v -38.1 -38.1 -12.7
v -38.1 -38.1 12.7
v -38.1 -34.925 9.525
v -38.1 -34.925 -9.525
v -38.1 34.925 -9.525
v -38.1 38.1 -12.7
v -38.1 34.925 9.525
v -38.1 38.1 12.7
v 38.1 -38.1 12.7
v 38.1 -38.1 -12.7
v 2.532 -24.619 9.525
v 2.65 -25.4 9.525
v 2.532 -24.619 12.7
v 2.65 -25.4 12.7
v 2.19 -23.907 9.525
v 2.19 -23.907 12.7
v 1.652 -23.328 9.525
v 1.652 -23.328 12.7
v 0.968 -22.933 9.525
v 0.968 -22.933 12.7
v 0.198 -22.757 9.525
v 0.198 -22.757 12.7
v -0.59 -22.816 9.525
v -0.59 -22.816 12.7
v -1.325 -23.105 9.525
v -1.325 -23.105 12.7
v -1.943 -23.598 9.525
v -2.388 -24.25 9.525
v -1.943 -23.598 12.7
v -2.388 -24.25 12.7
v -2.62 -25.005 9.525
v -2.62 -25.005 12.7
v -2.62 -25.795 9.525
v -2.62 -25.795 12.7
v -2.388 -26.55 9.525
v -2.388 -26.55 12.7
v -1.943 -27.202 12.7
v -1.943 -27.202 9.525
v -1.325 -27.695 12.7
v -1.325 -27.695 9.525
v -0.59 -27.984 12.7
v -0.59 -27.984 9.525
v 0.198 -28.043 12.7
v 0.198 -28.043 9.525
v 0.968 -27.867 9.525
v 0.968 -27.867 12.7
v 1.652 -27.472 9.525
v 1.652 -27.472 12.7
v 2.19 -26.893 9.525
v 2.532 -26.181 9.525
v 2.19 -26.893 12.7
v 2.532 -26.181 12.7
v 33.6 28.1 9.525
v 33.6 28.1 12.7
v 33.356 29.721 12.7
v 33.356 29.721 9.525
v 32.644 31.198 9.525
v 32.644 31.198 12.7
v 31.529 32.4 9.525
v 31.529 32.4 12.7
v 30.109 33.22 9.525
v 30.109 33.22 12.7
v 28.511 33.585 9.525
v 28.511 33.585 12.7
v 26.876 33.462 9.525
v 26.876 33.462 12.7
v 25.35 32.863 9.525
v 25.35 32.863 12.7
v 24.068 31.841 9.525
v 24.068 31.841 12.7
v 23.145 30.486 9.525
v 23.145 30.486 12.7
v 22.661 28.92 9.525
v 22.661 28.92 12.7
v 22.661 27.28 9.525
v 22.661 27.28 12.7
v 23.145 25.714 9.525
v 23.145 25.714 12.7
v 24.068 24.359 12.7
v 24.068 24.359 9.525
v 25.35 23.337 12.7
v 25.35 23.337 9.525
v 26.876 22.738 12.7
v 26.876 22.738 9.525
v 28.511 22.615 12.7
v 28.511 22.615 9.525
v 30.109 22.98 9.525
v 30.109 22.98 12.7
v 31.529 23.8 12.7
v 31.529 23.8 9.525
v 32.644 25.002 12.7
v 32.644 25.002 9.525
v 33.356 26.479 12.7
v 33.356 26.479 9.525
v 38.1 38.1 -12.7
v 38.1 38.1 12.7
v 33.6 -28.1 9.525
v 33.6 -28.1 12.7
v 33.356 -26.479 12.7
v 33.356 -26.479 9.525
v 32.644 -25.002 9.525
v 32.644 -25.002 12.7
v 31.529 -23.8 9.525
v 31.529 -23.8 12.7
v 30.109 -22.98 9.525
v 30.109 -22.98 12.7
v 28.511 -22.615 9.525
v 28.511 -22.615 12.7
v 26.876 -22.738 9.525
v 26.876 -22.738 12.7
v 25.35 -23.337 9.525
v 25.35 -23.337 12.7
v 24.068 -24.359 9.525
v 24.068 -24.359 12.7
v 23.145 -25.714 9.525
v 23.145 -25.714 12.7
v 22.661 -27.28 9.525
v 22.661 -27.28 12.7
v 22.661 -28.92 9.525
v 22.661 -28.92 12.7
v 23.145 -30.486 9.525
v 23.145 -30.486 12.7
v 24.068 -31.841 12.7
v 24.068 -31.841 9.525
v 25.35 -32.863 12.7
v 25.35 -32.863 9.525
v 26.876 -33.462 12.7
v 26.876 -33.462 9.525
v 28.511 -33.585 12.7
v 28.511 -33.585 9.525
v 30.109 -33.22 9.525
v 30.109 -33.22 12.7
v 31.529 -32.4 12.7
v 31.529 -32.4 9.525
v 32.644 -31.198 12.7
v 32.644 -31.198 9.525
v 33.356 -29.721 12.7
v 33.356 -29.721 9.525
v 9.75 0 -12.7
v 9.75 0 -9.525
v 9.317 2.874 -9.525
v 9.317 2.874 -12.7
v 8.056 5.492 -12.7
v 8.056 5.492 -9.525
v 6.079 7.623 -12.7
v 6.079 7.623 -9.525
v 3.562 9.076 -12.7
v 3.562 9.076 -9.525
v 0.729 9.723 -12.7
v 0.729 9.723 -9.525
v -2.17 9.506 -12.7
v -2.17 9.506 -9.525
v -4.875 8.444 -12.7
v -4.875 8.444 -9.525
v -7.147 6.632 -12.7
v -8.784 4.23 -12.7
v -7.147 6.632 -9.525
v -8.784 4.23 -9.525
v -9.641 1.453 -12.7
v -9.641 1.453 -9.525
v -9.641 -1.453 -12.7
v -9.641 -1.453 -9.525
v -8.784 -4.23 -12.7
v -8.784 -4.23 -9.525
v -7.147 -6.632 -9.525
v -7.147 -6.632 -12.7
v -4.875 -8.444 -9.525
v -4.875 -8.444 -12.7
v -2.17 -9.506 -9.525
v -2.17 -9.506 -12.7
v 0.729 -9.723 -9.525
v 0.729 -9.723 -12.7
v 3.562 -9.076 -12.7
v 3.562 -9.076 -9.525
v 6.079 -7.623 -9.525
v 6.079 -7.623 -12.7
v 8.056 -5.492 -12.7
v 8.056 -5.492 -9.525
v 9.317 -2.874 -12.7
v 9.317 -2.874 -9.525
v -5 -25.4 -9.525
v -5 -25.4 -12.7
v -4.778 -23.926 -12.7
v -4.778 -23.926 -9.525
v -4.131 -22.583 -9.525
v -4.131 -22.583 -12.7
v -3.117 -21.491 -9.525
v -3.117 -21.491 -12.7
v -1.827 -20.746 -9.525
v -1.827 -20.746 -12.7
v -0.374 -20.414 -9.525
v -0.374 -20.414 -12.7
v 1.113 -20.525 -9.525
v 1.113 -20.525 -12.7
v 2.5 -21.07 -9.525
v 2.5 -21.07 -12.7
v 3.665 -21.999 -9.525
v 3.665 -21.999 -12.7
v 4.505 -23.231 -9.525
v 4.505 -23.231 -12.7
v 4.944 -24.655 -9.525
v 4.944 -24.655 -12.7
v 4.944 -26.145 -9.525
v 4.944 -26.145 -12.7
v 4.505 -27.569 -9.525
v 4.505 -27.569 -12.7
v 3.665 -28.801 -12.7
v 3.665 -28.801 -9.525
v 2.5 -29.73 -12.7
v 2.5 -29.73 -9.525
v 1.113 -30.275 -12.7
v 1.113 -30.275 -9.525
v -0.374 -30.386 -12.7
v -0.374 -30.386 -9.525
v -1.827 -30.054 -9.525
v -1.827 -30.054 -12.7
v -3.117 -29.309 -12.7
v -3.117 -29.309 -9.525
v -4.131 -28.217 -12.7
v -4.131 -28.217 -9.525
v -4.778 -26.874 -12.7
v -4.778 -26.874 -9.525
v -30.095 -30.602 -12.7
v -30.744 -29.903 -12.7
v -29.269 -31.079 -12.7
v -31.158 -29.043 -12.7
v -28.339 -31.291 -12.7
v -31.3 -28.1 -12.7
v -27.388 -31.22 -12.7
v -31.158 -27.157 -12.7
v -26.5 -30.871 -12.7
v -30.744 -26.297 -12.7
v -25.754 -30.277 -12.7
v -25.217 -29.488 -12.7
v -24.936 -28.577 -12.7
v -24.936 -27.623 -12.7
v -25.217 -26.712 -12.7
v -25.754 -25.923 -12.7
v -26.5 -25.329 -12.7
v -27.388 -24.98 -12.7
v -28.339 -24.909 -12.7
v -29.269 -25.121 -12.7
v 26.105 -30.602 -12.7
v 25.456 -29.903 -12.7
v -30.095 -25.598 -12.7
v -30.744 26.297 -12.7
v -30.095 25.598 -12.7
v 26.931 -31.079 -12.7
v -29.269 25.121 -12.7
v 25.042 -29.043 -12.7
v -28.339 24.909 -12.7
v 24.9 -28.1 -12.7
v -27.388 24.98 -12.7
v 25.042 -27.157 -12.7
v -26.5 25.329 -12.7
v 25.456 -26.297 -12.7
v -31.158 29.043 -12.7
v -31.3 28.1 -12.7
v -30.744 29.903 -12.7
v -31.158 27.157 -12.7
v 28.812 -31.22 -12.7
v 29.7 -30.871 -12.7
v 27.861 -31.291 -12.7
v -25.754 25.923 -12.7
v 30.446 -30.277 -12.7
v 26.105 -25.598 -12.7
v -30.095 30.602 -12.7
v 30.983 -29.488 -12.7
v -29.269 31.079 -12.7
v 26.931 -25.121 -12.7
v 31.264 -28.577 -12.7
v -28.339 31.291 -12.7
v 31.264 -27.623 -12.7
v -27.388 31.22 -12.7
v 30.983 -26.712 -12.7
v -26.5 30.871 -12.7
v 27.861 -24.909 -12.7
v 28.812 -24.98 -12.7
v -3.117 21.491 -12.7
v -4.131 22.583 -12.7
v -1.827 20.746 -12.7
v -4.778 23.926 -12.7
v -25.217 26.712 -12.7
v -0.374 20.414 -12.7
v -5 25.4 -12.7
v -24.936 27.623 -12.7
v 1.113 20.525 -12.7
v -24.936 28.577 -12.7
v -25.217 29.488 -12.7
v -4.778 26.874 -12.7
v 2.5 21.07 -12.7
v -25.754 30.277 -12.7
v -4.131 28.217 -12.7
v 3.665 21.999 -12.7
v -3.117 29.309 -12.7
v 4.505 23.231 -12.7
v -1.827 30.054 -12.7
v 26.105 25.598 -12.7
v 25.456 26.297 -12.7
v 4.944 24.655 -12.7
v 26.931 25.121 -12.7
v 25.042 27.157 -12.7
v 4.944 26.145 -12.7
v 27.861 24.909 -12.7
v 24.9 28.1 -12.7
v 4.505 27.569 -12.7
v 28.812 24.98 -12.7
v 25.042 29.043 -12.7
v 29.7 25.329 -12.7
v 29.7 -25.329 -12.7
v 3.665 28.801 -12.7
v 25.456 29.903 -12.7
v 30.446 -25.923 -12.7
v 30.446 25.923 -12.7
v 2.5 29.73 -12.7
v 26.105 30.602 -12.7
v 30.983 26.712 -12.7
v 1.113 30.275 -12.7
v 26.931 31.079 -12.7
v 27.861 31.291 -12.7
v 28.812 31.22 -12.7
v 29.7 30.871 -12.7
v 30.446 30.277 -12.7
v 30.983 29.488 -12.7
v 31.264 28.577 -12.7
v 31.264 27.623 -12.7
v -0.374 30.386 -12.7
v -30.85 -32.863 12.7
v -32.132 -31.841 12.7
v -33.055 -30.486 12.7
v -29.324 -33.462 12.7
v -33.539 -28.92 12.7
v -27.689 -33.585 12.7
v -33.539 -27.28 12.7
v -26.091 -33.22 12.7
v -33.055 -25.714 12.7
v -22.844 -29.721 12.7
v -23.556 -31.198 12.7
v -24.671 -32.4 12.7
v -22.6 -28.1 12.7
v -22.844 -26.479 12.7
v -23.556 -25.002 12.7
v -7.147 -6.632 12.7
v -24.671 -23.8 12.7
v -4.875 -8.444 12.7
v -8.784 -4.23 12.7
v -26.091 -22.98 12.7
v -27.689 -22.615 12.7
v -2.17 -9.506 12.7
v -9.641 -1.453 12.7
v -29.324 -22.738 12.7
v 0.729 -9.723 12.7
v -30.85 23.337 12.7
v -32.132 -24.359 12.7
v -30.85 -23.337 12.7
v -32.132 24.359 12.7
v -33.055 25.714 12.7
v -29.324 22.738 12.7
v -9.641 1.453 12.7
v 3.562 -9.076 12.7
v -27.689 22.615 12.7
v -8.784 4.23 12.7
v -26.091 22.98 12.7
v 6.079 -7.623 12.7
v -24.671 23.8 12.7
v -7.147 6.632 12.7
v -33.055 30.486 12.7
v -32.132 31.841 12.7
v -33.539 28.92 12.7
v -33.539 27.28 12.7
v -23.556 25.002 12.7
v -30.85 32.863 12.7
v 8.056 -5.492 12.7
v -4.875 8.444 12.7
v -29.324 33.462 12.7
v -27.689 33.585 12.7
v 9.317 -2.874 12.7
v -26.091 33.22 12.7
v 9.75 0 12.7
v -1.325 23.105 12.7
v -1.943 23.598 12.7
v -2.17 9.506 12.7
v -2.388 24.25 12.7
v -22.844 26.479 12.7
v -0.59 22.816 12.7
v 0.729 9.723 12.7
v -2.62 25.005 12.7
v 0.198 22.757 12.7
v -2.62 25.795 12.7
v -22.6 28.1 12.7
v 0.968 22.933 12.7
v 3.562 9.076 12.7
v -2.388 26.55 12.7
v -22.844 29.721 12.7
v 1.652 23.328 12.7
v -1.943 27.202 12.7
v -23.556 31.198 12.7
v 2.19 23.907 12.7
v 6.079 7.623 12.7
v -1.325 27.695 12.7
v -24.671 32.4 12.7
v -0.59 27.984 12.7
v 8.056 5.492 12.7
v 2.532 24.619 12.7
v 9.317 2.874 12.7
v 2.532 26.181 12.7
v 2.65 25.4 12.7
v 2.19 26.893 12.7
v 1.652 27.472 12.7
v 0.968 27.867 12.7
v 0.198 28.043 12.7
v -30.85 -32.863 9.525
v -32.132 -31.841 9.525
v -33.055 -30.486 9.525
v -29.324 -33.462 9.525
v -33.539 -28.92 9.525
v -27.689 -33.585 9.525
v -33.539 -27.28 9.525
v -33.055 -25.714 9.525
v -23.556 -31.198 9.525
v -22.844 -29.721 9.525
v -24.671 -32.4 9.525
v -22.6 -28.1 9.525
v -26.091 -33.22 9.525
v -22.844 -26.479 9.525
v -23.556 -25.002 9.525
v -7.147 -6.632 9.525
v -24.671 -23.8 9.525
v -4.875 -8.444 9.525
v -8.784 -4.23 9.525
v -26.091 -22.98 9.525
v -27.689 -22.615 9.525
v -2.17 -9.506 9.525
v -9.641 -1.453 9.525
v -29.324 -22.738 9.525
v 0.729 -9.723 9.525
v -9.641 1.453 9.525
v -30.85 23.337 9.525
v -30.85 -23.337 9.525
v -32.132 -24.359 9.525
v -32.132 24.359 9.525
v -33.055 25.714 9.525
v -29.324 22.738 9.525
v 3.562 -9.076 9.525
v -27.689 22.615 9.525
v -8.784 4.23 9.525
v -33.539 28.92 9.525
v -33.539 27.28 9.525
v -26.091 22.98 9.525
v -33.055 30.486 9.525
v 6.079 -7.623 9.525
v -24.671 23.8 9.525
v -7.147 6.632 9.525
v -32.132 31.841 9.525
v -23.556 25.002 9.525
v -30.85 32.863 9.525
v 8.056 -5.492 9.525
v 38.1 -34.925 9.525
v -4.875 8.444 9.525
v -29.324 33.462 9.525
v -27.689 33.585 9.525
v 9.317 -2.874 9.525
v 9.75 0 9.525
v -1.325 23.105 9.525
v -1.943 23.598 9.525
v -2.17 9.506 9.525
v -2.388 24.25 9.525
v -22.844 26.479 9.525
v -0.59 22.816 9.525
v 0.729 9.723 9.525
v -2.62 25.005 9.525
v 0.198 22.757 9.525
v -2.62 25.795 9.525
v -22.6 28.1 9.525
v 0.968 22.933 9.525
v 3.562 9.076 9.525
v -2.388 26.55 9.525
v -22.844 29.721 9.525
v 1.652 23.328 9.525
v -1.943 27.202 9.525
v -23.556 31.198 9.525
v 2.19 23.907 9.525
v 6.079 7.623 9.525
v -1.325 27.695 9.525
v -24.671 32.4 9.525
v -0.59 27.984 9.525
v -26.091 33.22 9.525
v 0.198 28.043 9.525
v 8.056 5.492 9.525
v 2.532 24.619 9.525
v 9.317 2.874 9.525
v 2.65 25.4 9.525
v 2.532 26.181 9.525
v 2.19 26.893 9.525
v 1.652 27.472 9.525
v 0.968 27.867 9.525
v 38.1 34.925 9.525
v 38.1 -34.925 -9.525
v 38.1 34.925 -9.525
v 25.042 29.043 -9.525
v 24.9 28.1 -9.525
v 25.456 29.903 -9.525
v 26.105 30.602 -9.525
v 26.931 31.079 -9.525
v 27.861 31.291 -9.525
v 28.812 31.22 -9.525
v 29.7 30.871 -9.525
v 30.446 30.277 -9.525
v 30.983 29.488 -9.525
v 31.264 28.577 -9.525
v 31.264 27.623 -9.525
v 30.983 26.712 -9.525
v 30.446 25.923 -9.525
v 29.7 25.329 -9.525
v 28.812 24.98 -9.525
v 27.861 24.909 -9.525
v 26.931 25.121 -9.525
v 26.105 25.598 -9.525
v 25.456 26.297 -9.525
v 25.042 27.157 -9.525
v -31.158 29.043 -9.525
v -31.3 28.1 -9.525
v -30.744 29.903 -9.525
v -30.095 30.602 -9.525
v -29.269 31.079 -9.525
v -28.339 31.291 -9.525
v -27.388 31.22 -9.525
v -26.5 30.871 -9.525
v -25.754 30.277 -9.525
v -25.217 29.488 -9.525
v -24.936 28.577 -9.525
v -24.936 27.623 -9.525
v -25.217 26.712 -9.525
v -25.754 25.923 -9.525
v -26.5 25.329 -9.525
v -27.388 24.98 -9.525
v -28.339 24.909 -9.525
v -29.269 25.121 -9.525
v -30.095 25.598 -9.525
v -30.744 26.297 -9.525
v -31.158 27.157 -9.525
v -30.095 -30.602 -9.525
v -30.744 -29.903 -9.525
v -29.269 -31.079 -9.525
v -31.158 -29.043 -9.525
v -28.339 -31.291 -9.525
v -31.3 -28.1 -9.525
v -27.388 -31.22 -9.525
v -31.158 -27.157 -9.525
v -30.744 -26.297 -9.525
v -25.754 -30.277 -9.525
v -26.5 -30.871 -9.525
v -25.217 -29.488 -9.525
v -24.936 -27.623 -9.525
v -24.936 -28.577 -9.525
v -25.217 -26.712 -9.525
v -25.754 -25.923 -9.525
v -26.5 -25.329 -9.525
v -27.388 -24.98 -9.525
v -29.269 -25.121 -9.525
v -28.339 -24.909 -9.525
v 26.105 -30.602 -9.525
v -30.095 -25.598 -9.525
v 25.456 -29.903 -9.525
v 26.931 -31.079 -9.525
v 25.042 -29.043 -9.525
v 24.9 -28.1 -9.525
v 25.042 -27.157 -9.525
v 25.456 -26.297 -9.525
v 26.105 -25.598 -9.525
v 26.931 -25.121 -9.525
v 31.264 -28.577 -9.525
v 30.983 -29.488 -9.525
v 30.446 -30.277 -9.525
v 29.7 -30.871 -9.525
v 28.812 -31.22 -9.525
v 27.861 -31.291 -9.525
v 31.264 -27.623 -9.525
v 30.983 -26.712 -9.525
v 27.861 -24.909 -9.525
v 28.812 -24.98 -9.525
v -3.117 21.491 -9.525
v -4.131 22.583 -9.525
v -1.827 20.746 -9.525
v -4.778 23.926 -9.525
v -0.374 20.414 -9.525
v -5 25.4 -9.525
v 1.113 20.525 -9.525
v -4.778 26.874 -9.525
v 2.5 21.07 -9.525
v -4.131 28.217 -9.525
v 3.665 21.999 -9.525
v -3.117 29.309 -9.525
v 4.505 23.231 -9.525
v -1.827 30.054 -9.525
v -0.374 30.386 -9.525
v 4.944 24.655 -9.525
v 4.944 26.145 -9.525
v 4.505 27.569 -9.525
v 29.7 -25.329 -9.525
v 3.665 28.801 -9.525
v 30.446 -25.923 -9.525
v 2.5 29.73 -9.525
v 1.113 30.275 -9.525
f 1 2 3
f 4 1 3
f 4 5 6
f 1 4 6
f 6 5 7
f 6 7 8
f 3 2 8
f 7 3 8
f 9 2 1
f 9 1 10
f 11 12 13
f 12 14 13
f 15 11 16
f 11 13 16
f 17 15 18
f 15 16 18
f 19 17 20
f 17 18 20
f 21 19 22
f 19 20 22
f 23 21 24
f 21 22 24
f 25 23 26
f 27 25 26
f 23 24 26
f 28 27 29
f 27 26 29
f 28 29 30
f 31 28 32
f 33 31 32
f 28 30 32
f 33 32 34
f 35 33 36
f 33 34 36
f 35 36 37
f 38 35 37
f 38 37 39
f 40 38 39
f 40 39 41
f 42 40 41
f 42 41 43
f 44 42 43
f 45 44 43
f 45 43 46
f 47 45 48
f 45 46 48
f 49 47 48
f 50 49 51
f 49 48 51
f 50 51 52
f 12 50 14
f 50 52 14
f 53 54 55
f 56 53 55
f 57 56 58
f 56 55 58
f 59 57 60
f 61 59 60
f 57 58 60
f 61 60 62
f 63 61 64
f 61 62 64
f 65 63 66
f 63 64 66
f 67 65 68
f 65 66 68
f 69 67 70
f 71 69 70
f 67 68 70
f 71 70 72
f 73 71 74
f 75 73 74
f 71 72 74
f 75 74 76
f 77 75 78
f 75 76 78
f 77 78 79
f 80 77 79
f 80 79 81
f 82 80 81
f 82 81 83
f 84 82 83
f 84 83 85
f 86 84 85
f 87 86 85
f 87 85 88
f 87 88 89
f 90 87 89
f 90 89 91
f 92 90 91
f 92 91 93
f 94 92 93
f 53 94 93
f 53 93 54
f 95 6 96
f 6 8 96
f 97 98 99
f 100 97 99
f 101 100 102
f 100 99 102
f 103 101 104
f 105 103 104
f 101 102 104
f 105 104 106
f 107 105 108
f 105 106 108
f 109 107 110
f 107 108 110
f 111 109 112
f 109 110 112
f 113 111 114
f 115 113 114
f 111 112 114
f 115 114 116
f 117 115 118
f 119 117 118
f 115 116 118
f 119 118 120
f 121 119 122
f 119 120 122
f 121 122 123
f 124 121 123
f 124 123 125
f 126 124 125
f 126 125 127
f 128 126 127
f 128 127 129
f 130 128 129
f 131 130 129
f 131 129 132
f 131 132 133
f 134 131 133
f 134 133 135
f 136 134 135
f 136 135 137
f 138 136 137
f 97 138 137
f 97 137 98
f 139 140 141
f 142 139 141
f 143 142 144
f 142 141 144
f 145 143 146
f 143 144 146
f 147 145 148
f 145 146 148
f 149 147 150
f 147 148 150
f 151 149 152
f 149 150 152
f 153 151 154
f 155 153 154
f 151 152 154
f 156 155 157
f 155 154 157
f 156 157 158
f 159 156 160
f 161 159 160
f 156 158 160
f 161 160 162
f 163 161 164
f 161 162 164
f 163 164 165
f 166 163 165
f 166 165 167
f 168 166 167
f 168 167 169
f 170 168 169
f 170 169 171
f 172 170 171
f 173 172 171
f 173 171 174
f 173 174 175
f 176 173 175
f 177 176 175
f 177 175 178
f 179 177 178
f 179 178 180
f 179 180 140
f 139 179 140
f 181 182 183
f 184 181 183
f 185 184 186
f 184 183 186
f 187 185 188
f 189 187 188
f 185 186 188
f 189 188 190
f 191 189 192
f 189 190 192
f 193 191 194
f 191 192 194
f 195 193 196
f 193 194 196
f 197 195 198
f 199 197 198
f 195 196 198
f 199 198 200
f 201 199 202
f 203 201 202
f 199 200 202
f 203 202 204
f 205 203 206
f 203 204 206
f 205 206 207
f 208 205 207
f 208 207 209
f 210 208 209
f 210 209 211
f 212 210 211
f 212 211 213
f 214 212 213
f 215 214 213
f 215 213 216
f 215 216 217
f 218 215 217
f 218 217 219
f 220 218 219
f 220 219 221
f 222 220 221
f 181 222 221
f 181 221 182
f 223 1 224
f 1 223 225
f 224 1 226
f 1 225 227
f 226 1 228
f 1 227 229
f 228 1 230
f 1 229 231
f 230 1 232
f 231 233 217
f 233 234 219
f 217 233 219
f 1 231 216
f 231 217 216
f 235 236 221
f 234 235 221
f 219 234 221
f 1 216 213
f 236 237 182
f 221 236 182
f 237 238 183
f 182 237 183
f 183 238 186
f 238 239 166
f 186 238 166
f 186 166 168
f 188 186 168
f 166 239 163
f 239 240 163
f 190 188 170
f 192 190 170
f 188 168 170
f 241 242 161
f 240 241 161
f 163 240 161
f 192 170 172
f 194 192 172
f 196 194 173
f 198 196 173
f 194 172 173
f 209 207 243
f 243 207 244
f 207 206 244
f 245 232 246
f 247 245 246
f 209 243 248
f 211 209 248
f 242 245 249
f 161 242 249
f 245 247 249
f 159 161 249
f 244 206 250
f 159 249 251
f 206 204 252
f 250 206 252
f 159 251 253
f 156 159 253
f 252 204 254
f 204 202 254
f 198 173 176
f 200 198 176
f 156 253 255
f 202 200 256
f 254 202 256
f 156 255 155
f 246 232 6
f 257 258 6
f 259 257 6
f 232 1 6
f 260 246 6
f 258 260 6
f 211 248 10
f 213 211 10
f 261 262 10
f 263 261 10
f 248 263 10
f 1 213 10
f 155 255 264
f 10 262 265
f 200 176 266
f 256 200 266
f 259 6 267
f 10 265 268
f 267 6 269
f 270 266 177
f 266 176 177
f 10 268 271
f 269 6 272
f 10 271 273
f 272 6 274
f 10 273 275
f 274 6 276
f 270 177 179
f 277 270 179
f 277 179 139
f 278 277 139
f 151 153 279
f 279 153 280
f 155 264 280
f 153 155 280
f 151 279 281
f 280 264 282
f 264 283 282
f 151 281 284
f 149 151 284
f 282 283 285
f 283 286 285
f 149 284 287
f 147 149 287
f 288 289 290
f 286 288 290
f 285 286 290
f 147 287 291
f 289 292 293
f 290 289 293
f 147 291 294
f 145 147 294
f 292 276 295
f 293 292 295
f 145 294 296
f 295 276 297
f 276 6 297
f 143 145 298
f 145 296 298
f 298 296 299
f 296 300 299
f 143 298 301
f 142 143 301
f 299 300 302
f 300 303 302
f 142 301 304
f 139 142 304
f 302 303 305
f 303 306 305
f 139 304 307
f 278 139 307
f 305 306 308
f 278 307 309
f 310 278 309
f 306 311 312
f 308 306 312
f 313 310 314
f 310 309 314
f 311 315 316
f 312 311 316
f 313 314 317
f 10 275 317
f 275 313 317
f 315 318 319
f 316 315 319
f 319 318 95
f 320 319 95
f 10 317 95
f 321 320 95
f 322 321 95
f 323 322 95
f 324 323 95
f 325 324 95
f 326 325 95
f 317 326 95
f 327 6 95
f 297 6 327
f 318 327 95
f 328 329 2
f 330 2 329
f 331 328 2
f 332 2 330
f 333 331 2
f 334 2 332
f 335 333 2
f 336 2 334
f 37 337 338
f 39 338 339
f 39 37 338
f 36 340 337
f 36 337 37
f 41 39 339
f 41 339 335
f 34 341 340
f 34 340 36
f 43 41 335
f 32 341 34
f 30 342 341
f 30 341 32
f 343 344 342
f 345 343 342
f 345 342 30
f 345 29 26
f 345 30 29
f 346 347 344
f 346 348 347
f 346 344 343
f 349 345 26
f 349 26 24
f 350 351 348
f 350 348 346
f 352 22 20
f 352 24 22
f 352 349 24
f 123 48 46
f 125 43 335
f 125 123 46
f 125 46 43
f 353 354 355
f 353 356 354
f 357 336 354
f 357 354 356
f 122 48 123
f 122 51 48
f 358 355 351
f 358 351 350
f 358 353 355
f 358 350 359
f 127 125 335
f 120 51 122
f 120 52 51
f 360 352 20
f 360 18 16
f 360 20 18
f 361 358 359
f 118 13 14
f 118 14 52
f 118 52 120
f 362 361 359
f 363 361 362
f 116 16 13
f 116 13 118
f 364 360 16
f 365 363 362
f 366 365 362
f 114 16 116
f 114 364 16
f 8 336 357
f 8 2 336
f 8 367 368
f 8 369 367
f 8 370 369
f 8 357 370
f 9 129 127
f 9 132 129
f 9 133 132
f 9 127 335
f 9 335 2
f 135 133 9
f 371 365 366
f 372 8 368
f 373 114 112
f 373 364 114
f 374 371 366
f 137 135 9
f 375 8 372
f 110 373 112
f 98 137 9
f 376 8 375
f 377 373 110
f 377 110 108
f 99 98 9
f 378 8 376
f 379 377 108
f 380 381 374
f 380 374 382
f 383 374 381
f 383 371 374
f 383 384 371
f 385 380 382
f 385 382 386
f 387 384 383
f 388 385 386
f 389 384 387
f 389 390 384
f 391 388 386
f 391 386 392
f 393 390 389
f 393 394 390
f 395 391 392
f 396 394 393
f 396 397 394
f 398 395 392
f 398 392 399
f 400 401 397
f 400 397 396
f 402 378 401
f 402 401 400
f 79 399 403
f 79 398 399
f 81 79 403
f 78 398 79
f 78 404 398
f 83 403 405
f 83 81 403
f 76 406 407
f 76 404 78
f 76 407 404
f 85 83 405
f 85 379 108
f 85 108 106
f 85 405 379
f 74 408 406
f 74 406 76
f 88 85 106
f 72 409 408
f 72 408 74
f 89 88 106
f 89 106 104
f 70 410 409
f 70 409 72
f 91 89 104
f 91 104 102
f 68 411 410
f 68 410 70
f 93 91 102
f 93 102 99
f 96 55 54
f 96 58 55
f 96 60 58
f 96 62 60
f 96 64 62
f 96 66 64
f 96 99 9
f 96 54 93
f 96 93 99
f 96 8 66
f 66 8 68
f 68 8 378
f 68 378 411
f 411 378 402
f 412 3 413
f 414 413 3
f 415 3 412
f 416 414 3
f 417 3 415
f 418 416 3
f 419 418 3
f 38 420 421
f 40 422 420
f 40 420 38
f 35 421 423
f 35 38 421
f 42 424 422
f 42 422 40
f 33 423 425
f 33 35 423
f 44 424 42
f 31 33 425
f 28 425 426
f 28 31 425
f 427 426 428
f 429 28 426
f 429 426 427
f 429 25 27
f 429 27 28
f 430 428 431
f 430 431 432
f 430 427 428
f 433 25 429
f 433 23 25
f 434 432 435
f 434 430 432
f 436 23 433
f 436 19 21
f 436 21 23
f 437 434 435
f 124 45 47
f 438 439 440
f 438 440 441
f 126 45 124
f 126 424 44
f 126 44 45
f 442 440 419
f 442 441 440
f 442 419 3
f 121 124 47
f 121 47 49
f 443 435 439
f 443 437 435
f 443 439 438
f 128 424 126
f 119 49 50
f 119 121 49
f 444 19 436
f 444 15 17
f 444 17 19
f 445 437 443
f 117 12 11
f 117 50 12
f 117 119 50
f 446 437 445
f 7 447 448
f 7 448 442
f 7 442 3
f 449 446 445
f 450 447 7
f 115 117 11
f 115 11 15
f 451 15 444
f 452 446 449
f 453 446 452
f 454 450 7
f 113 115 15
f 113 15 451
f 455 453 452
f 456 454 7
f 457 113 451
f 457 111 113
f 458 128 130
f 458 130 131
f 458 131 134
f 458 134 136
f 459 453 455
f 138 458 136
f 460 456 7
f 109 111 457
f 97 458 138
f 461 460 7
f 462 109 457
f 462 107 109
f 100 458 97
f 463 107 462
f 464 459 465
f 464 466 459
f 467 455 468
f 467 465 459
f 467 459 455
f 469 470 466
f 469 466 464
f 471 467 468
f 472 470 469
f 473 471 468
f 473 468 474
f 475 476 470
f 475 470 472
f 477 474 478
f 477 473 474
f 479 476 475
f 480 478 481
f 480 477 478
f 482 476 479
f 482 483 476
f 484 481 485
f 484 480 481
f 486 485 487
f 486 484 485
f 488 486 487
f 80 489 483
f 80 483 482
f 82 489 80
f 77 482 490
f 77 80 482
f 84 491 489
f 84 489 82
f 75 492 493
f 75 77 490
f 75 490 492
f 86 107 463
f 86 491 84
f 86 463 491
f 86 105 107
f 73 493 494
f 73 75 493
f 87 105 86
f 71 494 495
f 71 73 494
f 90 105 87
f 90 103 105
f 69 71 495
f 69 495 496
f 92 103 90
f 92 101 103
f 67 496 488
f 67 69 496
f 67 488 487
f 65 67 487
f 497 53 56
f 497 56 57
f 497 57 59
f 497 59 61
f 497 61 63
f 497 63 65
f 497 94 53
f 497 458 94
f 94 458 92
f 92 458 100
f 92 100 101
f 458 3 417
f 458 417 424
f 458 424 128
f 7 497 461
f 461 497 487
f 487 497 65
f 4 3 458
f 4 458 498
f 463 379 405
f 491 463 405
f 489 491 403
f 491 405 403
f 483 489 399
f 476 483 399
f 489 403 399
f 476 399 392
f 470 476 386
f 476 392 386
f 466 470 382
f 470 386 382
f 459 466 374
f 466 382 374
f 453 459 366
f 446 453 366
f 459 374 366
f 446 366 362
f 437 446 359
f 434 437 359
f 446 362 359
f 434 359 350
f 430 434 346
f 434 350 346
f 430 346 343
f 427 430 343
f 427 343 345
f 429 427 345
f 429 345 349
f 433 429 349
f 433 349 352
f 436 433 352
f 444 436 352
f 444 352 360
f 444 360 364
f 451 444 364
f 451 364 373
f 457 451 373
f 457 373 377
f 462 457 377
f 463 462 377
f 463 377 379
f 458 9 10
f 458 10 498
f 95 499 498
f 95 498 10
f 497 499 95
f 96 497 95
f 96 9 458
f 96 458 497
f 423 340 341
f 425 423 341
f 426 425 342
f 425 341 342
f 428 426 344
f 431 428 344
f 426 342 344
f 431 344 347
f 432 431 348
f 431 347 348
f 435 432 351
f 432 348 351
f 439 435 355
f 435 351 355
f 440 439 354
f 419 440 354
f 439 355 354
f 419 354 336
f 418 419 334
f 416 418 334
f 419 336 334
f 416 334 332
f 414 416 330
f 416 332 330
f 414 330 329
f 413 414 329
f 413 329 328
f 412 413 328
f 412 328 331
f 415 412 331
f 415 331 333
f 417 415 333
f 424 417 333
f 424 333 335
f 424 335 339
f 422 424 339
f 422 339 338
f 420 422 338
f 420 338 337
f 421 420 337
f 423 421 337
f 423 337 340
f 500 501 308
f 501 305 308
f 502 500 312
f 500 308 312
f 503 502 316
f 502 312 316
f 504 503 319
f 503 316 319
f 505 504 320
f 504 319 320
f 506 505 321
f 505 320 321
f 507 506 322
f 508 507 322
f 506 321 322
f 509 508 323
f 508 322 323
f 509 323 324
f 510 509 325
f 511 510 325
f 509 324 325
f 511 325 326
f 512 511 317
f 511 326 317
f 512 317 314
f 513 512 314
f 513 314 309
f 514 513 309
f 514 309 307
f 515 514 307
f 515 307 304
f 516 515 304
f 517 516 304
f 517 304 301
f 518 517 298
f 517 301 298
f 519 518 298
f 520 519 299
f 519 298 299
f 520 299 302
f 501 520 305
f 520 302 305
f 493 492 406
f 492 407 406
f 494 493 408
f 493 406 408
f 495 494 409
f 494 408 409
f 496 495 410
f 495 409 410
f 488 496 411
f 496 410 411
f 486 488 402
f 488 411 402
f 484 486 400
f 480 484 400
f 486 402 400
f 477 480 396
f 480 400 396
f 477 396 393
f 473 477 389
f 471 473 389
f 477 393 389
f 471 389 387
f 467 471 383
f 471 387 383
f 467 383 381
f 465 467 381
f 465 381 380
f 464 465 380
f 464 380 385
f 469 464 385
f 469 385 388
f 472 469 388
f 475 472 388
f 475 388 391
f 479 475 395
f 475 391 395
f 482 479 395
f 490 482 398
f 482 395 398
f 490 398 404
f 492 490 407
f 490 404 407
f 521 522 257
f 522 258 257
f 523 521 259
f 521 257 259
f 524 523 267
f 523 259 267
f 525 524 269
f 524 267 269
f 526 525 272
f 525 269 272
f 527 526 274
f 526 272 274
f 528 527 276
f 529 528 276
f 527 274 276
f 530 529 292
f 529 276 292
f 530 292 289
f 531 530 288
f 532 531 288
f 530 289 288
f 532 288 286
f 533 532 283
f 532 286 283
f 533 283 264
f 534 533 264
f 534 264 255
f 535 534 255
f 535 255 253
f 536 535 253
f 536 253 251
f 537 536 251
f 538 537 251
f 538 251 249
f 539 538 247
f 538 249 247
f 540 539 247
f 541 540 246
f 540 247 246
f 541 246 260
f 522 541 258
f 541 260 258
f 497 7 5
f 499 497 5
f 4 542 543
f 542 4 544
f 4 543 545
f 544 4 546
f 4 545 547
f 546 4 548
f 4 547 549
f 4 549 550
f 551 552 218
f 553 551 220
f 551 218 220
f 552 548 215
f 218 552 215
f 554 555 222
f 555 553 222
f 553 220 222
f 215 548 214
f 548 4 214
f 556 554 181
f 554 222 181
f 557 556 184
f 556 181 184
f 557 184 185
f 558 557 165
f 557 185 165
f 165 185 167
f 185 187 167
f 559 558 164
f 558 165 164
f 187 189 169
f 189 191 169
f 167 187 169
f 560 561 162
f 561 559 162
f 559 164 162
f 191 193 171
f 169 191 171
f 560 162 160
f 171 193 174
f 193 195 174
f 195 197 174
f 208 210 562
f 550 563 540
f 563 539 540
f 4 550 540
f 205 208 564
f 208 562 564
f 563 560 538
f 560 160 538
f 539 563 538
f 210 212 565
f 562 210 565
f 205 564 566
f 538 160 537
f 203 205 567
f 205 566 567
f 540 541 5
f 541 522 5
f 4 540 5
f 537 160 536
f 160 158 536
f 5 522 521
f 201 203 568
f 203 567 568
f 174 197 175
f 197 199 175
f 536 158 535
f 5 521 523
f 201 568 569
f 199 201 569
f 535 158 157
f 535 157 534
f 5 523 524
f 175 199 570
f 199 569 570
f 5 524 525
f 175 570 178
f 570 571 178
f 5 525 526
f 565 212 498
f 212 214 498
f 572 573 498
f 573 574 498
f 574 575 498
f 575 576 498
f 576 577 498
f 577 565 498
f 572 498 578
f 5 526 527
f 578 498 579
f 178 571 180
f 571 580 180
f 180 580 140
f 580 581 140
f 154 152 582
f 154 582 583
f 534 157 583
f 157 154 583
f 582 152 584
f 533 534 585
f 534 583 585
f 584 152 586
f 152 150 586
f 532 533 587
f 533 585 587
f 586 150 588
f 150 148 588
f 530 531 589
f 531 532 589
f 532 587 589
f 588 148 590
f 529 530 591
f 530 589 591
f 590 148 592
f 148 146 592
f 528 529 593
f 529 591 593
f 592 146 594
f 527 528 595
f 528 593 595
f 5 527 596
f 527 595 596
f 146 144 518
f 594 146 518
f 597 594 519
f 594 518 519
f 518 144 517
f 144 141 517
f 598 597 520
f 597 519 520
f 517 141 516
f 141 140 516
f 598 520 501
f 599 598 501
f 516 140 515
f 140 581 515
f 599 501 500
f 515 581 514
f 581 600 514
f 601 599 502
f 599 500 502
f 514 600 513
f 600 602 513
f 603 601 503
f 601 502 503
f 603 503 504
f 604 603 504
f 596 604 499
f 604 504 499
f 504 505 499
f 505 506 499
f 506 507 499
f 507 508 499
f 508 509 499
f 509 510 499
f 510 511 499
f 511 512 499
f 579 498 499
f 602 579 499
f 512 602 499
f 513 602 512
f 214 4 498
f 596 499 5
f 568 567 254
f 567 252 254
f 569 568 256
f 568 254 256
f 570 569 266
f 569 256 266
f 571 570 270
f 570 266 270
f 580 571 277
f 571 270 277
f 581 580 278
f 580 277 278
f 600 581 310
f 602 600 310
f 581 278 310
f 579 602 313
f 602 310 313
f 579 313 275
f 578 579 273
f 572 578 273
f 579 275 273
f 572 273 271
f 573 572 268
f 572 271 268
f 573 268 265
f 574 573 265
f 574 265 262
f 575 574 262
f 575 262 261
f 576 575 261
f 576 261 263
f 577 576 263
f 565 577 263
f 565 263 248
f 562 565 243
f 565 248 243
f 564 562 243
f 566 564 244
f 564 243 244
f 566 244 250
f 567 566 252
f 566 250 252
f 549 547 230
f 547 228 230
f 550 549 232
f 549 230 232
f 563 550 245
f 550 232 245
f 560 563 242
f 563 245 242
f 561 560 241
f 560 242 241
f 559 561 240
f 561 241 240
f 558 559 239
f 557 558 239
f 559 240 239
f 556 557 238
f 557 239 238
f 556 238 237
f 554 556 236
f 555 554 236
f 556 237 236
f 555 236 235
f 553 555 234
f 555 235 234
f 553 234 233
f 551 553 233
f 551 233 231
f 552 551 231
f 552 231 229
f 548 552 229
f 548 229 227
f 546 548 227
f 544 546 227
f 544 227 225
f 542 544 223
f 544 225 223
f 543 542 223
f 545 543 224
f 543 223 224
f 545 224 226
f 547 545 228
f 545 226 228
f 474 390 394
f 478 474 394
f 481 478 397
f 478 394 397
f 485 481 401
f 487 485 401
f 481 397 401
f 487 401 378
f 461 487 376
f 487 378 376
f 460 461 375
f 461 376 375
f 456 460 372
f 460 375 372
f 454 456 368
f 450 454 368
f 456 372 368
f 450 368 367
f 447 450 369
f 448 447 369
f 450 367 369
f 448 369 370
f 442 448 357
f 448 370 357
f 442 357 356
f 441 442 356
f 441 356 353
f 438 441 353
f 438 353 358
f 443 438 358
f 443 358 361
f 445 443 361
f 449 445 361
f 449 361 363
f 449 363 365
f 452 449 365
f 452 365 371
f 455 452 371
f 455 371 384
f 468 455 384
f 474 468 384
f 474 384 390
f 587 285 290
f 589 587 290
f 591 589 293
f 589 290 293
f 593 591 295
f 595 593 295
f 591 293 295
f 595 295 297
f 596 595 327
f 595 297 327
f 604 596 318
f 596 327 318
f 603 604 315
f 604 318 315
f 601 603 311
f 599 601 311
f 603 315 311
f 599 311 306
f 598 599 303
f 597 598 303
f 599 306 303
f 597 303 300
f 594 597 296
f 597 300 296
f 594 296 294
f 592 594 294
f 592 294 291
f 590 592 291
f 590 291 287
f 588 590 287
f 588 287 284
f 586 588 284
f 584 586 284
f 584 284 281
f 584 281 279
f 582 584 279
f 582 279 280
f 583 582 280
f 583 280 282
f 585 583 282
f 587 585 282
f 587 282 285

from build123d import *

# Parameters (mm, degrees)
SKETCH1_W                                       = 76.2
SKETCH1_H                                       = 76.2
BOSS_EXTRUDE1_DEPTH                             = 12.7
SKETCH2_W                                       = 19.05
SKETCH2_H                                       = 69.85
CUT_EXTRUDE1_DEPTH                              = 77.2
SKETCH4_R                                       = 9.75
SKETCH4_R_2                                     = 2.2
SKETCH4_R_3                                     = 2.368967754
SKETCH4_R_4                                     = 2.114206927
SKETCH4_R_5                                     = 2.315385773
SKETCH4_R_6                                     = 1.799630575
CUT_EXTRUDE2_DEPTH                              = 26.4
CBORE_FOR_M6_SOCKET_HEAD_CAP_SCREW1_D           = 6.4
CBORE_FOR_M6_SOCKET_HEAD_CAP_SCREW1_CBORE_D     = 11
CBORE_FOR_M6_SOCKET_HEAD_CAP_SCREW1_CBORE_DEPTH = 6.4
CUT_EXTRUDE3_REACH                              = 27.4
SKETCH8_R                                       = 3.81
CBORE_FOR_M5_SOCKET_HEAD_CAP_SCREW3_D           = 5.3
CBORE_FOR_M5_SOCKET_HEAD_CAP_SCREW3_CBORE_D     = 10
CBORE_FOR_M5_SOCKET_HEAD_CAP_SCREW3_CBORE_DEPTH = 5.4


with BuildPart() as part:
    # Sketch1 → Boss-Extrude1 (new body, symmetric)
    with BuildSketch(Plane.XY):
        Rectangle(SKETCH1_W, SKETCH1_H)
    extrude(amount=BOSS_EXTRUDE1_DEPTH, both=True)

    # Sketch2 → Cut-Extrude1 (cut, through all)
    with BuildSketch(Plane(origin=(38.1, 0, 0), x_dir=(0, 0, -1), z_dir=(1, 0, 0))):
        Rectangle(SKETCH2_W, SKETCH2_H)
    extrude(amount=-CUT_EXTRUDE1_DEPTH, mode=Mode.SUBTRACT)

    # Sketch4 → Cut-Extrude2 (cut, through all)
    with BuildSketch(Plane.XY.offset(12.7)):
        Circle(SKETCH4_R)
        with Locations((0, 25.4)):
            Circle(SKETCH4_R_2)
        with Locations((-28.1, 28.1)):
            Circle(SKETCH4_R_3)
        with Locations((28.1, 28.1)):
            Circle(SKETCH4_R_4)
        with Locations((-28.1, -28.1)):
            Circle(SKETCH4_R_5)
        with Locations((28.1, -28.1)):
            Circle(SKETCH4_R_6)
        with Locations((0, -25.4)):
            Circle(SKETCH4_R_2)
    extrude(amount=-CUT_EXTRUDE2_DEPTH, mode=Mode.SUBTRACT)

    # CBORE for M6 Socket Head Cap Screw1 (through all)
    with Locations(Plane.XY.offset(12.7)):
        with Locations((-28.1, 28.1), (28.1, 28.1), (28.1, -28.1), (-28.1, -28.1)):
            CounterBoreHole(CBORE_FOR_M6_SOCKET_HEAD_CAP_SCREW1_D / 2, CBORE_FOR_M6_SOCKET_HEAD_CAP_SCREW1_CBORE_D / 2, CBORE_FOR_M6_SOCKET_HEAD_CAP_SCREW1_CBORE_DEPTH)

    # Sketch8 → Cut-Extrude3 (cut, up to next)
    with BuildSketch(Plane(origin=(0, 0, -12.7), x_dir=(-1, 0, 0), z_dir=(0, 0, -1)), mode=Mode.PRIVATE) as cut_extrude3_sk1:
        with Locations((0, 25.4)):
            Circle(SKETCH8_R)
    cut_extrude3_tool1 = extrude(cut_extrude3_sk1.sketch, amount=-CUT_EXTRUDE3_REACH, mode=Mode.PRIVATE) & part.part
    add(cut_extrude3_tool1.solids().sort_by_distance((0, 25.4, -12.7))[0], mode=Mode.SUBTRACT)
    # Sketch8 → Cut-Extrude3 (cut, up to next)
    with BuildSketch(Plane(origin=(0, 0, -12.7), x_dir=(-1, 0, 0), z_dir=(0, 0, -1)), mode=Mode.PRIVATE) as cut_extrude3_sk2:
        with Locations((0, -25.4)):
            Circle(SKETCH8_R)
    cut_extrude3_tool2 = extrude(cut_extrude3_sk2.sketch, amount=-CUT_EXTRUDE3_REACH, mode=Mode.PRIVATE) & part.part
    add(cut_extrude3_tool2.solids().sort_by_distance((0, -25.4, -12.7))[0], mode=Mode.SUBTRACT)

    # CBORE for M5 Socket Head Cap Screw3 (through all)
    with Locations(Plane(origin=(0, 0, -12.7), x_dir=(-1, 0, 0), z_dir=(0, 0, -1))):
        with Locations((0, -25.4), (0, 25.4)):
            CounterBoreHole(CBORE_FOR_M5_SOCKET_HEAD_CAP_SCREW3_D / 2, CBORE_FOR_M5_SOCKET_HEAD_CAP_SCREW3_CBORE_D / 2, CBORE_FOR_M5_SOCKET_HEAD_CAP_SCREW3_CBORE_DEPTH)


solid = part.part
